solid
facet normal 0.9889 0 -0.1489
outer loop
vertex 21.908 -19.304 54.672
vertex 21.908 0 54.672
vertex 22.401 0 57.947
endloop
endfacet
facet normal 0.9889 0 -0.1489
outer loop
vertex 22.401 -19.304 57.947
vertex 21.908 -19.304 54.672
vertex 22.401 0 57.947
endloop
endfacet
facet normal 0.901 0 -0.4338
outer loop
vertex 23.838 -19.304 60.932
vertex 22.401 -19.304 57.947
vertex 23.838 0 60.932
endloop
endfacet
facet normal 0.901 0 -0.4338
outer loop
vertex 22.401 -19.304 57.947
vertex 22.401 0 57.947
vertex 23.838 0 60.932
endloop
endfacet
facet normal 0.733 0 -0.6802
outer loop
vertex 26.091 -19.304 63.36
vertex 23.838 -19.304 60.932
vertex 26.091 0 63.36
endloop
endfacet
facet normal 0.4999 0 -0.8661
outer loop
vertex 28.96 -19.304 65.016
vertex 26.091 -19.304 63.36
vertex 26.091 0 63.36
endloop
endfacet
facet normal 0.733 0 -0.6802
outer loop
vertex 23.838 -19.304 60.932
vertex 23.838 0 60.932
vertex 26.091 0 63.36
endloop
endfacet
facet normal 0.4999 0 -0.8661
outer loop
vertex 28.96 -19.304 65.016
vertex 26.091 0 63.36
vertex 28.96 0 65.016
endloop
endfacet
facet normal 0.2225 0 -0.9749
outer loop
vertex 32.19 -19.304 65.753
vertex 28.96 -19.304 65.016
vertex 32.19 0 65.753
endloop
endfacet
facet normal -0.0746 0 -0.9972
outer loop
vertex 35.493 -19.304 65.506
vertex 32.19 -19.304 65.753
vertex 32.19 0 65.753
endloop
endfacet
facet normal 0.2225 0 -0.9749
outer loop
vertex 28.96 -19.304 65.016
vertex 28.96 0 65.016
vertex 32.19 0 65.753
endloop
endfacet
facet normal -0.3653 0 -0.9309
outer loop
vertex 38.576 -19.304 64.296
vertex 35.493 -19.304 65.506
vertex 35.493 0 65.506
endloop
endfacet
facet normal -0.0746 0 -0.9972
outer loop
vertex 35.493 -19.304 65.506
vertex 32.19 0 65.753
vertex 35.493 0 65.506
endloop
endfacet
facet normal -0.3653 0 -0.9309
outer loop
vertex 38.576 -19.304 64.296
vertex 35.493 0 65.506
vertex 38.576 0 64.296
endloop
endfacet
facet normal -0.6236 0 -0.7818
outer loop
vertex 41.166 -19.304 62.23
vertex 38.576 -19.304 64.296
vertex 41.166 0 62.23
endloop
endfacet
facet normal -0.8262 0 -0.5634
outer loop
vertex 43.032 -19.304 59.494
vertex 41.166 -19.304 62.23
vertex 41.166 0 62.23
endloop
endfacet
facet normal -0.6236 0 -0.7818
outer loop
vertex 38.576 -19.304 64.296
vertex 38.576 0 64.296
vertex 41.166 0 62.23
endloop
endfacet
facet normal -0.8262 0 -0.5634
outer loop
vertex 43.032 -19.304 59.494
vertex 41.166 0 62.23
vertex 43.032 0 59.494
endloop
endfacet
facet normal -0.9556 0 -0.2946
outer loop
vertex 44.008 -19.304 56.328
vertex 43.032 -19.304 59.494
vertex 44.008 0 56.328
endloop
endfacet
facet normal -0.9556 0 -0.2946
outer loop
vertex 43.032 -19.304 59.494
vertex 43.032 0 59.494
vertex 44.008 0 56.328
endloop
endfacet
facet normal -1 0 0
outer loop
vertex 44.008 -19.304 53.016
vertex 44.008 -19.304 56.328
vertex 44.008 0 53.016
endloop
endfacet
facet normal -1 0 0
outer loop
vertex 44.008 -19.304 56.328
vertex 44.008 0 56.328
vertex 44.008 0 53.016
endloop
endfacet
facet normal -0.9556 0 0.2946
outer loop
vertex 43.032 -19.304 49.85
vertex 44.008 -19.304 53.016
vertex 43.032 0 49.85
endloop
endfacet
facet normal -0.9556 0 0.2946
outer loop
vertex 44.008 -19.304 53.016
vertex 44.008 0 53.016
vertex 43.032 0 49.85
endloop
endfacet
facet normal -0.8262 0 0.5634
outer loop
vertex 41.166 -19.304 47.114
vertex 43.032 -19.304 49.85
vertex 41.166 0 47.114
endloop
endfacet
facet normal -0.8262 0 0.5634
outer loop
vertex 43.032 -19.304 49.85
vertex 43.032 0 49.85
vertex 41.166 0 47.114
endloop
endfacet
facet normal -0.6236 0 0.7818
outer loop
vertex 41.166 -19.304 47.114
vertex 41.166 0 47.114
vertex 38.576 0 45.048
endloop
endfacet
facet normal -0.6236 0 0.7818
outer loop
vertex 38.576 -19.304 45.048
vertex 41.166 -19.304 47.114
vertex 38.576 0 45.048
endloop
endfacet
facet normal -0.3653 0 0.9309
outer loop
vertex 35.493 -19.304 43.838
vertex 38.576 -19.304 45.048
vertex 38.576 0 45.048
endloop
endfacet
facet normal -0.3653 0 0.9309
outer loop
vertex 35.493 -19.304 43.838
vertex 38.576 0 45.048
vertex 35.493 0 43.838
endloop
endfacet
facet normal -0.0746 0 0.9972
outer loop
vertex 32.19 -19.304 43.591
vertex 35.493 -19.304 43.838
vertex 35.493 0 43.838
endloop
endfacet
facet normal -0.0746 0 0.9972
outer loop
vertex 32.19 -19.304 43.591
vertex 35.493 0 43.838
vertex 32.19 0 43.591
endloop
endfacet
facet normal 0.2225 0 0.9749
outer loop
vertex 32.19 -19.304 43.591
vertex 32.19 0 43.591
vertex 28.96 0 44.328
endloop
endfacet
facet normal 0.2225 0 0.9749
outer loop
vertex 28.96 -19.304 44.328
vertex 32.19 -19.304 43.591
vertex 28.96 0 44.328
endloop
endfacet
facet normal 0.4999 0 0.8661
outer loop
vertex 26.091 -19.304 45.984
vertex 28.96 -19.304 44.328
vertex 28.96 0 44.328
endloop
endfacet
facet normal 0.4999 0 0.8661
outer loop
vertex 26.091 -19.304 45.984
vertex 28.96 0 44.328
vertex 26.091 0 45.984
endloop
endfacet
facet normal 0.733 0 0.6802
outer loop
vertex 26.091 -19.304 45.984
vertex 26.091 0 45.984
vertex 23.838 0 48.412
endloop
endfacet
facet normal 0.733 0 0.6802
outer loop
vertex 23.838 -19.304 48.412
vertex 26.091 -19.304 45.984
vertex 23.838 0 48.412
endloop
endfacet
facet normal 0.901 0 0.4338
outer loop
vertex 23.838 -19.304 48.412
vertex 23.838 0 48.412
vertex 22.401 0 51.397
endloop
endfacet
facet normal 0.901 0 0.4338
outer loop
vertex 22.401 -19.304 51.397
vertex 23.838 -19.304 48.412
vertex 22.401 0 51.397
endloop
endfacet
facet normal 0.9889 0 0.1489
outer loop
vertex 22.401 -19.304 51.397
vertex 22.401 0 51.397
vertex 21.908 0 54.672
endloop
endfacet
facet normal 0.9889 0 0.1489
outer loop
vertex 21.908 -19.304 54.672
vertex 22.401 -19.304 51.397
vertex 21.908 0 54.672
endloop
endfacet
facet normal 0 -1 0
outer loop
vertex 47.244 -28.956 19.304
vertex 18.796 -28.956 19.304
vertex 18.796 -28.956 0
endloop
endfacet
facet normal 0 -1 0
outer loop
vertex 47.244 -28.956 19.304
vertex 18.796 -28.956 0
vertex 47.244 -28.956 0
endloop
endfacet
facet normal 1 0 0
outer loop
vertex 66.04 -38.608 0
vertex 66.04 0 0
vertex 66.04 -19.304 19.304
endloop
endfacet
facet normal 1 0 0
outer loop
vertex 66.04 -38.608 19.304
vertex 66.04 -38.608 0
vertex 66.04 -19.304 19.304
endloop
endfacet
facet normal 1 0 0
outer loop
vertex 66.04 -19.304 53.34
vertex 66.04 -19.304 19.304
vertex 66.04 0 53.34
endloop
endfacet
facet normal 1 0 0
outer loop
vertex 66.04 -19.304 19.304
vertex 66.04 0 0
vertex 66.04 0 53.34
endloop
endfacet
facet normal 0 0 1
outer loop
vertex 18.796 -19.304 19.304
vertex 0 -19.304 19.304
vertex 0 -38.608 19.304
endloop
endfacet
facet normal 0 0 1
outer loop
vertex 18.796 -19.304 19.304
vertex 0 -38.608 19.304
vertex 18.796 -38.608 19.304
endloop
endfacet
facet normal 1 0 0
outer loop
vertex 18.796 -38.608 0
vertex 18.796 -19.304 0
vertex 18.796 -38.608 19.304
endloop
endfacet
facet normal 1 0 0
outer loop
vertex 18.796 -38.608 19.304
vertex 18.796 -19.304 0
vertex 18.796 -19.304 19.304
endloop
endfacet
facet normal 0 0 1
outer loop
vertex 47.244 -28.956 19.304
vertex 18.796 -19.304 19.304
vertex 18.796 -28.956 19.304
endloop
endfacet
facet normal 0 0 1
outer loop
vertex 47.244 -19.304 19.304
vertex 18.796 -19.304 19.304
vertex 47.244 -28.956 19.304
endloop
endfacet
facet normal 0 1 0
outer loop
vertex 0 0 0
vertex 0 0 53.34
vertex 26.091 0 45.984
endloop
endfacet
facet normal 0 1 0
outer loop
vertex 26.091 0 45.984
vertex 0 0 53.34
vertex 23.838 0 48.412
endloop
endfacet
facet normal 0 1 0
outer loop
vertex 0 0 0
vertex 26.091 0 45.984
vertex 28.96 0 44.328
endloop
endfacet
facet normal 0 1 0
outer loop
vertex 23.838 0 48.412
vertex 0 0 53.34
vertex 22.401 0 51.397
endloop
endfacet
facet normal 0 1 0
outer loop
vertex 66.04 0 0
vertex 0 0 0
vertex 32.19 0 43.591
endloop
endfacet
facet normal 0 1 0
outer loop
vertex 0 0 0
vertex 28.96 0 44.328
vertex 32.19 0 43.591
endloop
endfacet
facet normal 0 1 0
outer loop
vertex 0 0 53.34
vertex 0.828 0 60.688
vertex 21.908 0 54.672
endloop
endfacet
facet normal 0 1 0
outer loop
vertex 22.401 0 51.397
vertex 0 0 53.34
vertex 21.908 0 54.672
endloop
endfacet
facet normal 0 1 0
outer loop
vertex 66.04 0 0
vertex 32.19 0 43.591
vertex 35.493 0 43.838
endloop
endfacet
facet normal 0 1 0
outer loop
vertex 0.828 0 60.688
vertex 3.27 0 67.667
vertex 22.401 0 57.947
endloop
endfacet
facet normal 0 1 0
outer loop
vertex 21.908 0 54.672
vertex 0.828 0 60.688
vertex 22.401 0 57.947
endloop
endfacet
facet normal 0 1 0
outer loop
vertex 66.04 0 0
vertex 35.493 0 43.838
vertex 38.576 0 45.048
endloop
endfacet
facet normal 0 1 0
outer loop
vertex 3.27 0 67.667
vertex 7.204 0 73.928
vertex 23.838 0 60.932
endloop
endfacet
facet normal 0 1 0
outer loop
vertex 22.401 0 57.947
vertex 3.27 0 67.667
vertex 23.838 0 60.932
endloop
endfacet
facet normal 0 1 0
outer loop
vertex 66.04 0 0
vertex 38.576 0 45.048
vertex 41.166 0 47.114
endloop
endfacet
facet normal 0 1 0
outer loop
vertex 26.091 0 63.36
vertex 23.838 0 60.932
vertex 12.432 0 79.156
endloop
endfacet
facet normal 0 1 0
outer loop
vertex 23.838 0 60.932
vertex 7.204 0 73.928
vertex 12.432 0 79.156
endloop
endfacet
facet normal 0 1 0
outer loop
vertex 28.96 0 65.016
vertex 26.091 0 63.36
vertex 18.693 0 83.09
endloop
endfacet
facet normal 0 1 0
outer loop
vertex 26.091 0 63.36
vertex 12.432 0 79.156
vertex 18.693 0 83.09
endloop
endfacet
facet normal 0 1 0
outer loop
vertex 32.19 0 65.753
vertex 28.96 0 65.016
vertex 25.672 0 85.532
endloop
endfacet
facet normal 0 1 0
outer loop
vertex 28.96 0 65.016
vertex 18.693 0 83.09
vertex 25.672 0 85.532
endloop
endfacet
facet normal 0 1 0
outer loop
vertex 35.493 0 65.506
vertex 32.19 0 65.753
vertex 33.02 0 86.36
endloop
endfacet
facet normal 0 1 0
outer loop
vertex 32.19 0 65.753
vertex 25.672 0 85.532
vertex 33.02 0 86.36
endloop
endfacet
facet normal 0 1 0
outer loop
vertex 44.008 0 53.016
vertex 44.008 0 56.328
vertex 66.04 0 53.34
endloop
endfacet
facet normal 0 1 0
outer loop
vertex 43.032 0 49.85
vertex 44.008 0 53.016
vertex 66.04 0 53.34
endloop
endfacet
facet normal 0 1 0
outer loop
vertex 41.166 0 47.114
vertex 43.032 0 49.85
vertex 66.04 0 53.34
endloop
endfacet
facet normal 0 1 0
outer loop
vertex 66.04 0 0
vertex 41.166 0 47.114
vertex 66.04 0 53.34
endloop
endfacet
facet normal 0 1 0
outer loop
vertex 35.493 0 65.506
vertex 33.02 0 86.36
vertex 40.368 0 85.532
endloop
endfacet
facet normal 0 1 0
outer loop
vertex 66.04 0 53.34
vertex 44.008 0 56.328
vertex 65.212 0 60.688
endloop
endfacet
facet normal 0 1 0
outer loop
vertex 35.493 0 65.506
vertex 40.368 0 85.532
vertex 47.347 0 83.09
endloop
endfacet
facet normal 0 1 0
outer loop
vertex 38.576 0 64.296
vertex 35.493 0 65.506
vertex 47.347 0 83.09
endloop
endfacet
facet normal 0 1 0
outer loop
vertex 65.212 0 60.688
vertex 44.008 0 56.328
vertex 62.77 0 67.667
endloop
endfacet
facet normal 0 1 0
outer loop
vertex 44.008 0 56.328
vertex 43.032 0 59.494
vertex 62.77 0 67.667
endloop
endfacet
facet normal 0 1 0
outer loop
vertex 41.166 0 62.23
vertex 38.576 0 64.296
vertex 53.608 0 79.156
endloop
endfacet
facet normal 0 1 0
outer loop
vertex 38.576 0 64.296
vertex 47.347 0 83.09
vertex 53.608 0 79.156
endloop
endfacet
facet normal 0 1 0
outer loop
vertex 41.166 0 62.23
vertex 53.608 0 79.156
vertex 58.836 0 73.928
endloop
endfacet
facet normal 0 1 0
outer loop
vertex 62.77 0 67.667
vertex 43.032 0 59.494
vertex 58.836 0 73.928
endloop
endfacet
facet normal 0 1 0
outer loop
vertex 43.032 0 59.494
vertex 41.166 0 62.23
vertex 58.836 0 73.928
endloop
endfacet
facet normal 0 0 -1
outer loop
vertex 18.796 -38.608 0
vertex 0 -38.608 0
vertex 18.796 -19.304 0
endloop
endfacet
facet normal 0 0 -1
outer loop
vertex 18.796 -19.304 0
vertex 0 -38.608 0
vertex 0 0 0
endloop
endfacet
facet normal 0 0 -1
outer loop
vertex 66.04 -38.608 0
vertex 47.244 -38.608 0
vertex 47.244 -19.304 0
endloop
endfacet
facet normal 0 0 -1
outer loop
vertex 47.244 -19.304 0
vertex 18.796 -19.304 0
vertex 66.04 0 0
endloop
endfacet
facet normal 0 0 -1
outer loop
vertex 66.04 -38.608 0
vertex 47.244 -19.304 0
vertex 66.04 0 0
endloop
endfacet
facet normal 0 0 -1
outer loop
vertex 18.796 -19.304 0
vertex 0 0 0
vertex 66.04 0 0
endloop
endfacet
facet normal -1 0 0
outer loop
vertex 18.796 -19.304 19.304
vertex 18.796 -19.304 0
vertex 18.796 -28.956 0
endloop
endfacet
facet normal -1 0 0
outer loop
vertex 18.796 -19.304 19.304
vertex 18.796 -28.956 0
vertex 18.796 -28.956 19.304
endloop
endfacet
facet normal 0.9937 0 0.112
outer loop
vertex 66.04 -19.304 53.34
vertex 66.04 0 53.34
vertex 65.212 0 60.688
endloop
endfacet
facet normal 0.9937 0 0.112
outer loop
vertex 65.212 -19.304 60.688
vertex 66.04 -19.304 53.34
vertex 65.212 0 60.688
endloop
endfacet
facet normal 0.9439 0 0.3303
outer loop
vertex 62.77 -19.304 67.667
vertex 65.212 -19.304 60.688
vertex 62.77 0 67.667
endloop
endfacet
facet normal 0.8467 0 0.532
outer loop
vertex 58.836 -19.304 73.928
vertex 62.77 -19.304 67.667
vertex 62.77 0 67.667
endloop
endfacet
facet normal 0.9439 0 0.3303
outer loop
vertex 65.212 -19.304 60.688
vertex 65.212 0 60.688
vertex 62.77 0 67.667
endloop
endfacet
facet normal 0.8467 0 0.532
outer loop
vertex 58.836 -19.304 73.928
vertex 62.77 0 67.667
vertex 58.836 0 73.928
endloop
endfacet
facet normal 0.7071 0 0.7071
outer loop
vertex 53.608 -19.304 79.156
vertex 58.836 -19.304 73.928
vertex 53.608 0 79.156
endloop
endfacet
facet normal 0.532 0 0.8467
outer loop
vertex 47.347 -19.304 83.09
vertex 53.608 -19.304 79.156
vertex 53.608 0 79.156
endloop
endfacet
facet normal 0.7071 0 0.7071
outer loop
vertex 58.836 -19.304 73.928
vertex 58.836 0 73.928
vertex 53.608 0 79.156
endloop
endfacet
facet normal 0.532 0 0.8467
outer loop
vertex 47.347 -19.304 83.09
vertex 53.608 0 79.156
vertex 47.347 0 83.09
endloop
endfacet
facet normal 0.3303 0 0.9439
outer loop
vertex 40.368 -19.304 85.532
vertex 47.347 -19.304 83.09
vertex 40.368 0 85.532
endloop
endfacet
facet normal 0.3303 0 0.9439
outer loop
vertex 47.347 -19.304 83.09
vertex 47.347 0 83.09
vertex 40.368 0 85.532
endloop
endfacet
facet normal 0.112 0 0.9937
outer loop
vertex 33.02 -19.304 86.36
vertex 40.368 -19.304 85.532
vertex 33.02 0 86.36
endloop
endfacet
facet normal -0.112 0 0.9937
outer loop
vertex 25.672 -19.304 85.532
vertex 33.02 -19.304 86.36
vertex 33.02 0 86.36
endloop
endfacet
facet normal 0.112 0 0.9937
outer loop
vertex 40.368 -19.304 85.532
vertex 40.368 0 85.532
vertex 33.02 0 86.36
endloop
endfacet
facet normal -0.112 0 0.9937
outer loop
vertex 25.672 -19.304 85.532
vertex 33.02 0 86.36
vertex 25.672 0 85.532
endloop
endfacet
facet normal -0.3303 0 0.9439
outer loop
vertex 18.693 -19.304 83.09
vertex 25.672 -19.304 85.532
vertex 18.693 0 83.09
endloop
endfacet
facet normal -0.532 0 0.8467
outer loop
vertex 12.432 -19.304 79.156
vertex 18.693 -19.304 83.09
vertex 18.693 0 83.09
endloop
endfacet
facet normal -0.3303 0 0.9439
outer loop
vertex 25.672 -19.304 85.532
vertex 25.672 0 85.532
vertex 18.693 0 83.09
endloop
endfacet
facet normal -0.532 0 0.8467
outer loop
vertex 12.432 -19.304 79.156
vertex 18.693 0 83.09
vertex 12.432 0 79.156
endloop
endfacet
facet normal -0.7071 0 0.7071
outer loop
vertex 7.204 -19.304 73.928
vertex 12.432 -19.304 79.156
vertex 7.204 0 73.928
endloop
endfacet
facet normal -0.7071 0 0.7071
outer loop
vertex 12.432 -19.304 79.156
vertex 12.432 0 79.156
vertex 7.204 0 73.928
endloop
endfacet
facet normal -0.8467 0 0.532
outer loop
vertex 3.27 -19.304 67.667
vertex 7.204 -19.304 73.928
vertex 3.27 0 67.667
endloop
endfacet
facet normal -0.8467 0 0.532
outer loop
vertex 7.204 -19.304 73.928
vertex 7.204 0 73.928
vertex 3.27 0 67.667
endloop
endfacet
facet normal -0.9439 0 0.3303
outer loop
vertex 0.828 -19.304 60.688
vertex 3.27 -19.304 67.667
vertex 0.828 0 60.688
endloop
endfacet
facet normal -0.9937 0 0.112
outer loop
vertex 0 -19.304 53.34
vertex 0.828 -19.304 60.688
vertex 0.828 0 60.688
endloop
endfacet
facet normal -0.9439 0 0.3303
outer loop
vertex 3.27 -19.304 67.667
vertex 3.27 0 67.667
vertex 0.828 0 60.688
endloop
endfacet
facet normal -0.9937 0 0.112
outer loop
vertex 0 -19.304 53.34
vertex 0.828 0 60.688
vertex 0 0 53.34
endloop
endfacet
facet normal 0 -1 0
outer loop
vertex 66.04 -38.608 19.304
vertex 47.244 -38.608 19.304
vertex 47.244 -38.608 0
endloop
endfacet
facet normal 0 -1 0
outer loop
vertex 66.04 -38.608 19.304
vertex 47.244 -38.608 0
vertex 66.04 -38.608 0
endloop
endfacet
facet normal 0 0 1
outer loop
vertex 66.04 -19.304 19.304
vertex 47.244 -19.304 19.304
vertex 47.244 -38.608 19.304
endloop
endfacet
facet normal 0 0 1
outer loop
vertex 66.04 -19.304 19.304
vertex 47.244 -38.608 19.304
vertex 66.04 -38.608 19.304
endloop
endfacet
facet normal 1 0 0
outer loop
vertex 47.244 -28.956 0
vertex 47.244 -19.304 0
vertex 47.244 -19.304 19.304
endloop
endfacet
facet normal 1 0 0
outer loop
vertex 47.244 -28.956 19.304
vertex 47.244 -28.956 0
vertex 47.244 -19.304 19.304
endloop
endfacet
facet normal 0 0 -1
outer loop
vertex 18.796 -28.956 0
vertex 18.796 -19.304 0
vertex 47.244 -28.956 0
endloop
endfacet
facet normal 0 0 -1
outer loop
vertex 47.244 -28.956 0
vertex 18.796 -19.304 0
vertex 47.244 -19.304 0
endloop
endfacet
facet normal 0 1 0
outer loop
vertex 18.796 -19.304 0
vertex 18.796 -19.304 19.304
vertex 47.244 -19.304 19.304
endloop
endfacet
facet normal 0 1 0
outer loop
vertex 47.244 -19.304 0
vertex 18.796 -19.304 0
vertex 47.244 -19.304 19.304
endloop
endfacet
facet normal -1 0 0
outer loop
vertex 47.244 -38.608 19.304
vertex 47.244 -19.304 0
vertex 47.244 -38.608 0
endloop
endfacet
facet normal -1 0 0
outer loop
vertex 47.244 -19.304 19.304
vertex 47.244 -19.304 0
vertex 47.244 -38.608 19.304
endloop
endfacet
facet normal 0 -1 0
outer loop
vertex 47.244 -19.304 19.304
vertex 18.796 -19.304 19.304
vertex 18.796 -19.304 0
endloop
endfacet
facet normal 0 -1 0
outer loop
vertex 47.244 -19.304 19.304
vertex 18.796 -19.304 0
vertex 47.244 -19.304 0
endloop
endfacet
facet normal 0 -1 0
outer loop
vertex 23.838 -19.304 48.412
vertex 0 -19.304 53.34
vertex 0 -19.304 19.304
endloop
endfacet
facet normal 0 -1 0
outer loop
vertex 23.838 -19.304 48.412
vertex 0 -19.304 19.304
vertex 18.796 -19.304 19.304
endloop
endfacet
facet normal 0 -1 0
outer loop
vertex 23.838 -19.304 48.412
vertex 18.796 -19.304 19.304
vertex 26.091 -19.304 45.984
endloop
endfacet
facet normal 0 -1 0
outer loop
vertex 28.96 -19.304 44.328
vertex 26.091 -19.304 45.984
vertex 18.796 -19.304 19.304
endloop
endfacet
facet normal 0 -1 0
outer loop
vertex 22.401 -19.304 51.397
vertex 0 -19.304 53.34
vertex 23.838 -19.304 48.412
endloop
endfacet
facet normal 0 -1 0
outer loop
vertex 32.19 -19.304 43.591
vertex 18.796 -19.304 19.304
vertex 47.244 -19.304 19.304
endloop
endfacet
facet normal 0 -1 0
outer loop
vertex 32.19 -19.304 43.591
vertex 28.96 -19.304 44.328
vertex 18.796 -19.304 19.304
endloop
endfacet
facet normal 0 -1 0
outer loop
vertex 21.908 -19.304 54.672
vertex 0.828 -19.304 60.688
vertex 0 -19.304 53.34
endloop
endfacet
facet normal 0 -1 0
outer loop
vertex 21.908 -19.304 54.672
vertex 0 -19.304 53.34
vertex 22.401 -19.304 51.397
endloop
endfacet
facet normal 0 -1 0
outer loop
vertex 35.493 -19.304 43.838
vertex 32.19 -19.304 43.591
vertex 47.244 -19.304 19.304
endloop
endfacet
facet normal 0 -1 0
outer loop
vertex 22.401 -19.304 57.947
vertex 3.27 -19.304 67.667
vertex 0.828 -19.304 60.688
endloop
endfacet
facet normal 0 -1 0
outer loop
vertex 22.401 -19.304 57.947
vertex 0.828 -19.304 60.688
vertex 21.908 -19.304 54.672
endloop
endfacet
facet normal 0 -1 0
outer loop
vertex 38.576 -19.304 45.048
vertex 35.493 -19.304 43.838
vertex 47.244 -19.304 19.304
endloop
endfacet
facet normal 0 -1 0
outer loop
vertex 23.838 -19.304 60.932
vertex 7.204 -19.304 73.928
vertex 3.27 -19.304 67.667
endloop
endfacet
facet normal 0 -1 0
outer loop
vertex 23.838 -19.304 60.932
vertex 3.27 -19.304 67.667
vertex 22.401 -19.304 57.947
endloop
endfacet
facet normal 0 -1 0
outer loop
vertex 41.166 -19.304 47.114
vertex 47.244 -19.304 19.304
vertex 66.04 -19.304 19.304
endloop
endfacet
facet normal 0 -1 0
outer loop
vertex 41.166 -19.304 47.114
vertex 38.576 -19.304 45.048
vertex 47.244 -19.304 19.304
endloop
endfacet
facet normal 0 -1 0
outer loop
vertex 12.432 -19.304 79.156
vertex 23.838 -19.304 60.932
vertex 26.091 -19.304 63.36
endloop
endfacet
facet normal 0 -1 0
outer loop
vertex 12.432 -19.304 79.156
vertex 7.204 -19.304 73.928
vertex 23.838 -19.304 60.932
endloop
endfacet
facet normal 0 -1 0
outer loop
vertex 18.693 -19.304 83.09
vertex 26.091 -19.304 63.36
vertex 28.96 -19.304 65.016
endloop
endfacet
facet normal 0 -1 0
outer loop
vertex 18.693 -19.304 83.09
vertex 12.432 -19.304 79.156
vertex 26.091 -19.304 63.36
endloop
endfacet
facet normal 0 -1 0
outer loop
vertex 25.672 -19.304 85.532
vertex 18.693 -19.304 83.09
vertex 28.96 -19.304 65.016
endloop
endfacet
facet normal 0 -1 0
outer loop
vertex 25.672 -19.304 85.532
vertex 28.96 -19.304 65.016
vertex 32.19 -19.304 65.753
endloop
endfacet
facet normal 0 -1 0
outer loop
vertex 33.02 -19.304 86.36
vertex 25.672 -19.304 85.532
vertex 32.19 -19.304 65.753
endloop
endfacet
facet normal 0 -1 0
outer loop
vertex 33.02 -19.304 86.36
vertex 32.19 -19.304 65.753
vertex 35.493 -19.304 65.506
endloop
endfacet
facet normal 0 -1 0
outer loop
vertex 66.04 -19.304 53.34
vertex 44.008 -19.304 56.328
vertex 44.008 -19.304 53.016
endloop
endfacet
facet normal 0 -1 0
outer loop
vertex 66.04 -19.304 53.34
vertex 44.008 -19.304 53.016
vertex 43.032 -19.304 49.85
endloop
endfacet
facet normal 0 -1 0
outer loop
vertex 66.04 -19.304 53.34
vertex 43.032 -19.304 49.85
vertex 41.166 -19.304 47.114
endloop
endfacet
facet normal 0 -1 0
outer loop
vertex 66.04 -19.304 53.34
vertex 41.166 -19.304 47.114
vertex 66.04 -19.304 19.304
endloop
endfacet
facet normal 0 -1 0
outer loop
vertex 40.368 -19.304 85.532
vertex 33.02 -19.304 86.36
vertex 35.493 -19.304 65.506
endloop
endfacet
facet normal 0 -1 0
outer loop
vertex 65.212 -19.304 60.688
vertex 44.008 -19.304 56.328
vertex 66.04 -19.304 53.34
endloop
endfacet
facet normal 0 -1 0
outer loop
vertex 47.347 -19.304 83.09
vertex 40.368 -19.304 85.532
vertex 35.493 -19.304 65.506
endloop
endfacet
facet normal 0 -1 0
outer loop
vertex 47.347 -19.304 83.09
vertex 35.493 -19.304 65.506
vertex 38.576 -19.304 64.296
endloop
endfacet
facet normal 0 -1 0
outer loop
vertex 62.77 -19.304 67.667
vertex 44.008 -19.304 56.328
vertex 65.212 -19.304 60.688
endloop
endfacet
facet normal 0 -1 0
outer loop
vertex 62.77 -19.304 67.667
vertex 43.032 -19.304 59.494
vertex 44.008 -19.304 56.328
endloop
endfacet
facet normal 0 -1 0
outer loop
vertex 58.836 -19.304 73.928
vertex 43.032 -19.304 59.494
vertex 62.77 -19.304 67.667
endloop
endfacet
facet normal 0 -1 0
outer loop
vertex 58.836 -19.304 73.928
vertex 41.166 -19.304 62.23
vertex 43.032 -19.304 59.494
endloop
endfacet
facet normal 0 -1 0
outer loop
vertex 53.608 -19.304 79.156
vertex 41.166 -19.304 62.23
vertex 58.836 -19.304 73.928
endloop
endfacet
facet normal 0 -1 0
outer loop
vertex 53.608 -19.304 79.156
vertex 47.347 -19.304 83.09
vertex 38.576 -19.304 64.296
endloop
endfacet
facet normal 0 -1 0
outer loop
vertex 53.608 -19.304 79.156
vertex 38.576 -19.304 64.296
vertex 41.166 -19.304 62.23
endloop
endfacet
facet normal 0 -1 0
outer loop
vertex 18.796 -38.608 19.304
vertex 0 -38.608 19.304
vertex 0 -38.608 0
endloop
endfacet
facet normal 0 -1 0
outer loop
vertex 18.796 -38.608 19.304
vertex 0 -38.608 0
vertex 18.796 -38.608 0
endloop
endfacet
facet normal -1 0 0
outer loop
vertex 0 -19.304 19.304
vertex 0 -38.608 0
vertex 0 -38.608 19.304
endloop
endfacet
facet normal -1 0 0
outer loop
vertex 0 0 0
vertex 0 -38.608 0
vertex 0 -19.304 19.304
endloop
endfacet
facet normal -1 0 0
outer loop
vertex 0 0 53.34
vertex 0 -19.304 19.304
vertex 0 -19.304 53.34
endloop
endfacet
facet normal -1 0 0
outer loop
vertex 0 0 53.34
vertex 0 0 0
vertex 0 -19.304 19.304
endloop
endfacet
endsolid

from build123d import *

# Parameters (mm, degrees)
F0_W     = 66.04
F0_H     = 53.34
F1_DEPTH = 19.304
F2_W     = 18.796
F2_H     = 19.304
F3_DEPTH = 19.304
F2_W_2   = 28.448
F4_DEPTH = 9.652
F6_D     = 22.225


with BuildPart() as f1:
    # F0 (on Front) → F1 (new body)
    with BuildSketch(Plane.XZ):
        with Locations((33.02, 26.67)):
            Rectangle(F0_W, F0_H)
        with BuildLine():
            ThreePointArc((66.04, 53.34), (33.02, 86.36), (0, 53.34))
            Line((0, 53.34), (66.04, 53.34))
        make_face()
    extrude(amount=F1_DEPTH)

    # F2 (on face) → F3 (join)
    with BuildSketch(Plane.XZ.offset(19.304)):
        with Locations((9.398, 9.652)):
            Rectangle(F2_W, F2_H)
        with Locations((56.642, 9.652)):
            Rectangle(F2_W, F2_H)
    extrude(amount=F3_DEPTH)

    # F6 (through all)
    with Locations(Plane.XZ.offset(19.304)):
        with Locations((33.02, 54.672021)):
            Hole(F6_D / 2)


with BuildPart() as f4:
    # F2 (on face) → F4 (new body)
    with BuildSketch(Plane.XZ.offset(19.304)):
        with Locations((33.02, 9.652)):
            Rectangle(F2_W_2, F2_H)
    extrude(amount=F4_DEPTH)


solid = Compound([f1.part, f4.part])
